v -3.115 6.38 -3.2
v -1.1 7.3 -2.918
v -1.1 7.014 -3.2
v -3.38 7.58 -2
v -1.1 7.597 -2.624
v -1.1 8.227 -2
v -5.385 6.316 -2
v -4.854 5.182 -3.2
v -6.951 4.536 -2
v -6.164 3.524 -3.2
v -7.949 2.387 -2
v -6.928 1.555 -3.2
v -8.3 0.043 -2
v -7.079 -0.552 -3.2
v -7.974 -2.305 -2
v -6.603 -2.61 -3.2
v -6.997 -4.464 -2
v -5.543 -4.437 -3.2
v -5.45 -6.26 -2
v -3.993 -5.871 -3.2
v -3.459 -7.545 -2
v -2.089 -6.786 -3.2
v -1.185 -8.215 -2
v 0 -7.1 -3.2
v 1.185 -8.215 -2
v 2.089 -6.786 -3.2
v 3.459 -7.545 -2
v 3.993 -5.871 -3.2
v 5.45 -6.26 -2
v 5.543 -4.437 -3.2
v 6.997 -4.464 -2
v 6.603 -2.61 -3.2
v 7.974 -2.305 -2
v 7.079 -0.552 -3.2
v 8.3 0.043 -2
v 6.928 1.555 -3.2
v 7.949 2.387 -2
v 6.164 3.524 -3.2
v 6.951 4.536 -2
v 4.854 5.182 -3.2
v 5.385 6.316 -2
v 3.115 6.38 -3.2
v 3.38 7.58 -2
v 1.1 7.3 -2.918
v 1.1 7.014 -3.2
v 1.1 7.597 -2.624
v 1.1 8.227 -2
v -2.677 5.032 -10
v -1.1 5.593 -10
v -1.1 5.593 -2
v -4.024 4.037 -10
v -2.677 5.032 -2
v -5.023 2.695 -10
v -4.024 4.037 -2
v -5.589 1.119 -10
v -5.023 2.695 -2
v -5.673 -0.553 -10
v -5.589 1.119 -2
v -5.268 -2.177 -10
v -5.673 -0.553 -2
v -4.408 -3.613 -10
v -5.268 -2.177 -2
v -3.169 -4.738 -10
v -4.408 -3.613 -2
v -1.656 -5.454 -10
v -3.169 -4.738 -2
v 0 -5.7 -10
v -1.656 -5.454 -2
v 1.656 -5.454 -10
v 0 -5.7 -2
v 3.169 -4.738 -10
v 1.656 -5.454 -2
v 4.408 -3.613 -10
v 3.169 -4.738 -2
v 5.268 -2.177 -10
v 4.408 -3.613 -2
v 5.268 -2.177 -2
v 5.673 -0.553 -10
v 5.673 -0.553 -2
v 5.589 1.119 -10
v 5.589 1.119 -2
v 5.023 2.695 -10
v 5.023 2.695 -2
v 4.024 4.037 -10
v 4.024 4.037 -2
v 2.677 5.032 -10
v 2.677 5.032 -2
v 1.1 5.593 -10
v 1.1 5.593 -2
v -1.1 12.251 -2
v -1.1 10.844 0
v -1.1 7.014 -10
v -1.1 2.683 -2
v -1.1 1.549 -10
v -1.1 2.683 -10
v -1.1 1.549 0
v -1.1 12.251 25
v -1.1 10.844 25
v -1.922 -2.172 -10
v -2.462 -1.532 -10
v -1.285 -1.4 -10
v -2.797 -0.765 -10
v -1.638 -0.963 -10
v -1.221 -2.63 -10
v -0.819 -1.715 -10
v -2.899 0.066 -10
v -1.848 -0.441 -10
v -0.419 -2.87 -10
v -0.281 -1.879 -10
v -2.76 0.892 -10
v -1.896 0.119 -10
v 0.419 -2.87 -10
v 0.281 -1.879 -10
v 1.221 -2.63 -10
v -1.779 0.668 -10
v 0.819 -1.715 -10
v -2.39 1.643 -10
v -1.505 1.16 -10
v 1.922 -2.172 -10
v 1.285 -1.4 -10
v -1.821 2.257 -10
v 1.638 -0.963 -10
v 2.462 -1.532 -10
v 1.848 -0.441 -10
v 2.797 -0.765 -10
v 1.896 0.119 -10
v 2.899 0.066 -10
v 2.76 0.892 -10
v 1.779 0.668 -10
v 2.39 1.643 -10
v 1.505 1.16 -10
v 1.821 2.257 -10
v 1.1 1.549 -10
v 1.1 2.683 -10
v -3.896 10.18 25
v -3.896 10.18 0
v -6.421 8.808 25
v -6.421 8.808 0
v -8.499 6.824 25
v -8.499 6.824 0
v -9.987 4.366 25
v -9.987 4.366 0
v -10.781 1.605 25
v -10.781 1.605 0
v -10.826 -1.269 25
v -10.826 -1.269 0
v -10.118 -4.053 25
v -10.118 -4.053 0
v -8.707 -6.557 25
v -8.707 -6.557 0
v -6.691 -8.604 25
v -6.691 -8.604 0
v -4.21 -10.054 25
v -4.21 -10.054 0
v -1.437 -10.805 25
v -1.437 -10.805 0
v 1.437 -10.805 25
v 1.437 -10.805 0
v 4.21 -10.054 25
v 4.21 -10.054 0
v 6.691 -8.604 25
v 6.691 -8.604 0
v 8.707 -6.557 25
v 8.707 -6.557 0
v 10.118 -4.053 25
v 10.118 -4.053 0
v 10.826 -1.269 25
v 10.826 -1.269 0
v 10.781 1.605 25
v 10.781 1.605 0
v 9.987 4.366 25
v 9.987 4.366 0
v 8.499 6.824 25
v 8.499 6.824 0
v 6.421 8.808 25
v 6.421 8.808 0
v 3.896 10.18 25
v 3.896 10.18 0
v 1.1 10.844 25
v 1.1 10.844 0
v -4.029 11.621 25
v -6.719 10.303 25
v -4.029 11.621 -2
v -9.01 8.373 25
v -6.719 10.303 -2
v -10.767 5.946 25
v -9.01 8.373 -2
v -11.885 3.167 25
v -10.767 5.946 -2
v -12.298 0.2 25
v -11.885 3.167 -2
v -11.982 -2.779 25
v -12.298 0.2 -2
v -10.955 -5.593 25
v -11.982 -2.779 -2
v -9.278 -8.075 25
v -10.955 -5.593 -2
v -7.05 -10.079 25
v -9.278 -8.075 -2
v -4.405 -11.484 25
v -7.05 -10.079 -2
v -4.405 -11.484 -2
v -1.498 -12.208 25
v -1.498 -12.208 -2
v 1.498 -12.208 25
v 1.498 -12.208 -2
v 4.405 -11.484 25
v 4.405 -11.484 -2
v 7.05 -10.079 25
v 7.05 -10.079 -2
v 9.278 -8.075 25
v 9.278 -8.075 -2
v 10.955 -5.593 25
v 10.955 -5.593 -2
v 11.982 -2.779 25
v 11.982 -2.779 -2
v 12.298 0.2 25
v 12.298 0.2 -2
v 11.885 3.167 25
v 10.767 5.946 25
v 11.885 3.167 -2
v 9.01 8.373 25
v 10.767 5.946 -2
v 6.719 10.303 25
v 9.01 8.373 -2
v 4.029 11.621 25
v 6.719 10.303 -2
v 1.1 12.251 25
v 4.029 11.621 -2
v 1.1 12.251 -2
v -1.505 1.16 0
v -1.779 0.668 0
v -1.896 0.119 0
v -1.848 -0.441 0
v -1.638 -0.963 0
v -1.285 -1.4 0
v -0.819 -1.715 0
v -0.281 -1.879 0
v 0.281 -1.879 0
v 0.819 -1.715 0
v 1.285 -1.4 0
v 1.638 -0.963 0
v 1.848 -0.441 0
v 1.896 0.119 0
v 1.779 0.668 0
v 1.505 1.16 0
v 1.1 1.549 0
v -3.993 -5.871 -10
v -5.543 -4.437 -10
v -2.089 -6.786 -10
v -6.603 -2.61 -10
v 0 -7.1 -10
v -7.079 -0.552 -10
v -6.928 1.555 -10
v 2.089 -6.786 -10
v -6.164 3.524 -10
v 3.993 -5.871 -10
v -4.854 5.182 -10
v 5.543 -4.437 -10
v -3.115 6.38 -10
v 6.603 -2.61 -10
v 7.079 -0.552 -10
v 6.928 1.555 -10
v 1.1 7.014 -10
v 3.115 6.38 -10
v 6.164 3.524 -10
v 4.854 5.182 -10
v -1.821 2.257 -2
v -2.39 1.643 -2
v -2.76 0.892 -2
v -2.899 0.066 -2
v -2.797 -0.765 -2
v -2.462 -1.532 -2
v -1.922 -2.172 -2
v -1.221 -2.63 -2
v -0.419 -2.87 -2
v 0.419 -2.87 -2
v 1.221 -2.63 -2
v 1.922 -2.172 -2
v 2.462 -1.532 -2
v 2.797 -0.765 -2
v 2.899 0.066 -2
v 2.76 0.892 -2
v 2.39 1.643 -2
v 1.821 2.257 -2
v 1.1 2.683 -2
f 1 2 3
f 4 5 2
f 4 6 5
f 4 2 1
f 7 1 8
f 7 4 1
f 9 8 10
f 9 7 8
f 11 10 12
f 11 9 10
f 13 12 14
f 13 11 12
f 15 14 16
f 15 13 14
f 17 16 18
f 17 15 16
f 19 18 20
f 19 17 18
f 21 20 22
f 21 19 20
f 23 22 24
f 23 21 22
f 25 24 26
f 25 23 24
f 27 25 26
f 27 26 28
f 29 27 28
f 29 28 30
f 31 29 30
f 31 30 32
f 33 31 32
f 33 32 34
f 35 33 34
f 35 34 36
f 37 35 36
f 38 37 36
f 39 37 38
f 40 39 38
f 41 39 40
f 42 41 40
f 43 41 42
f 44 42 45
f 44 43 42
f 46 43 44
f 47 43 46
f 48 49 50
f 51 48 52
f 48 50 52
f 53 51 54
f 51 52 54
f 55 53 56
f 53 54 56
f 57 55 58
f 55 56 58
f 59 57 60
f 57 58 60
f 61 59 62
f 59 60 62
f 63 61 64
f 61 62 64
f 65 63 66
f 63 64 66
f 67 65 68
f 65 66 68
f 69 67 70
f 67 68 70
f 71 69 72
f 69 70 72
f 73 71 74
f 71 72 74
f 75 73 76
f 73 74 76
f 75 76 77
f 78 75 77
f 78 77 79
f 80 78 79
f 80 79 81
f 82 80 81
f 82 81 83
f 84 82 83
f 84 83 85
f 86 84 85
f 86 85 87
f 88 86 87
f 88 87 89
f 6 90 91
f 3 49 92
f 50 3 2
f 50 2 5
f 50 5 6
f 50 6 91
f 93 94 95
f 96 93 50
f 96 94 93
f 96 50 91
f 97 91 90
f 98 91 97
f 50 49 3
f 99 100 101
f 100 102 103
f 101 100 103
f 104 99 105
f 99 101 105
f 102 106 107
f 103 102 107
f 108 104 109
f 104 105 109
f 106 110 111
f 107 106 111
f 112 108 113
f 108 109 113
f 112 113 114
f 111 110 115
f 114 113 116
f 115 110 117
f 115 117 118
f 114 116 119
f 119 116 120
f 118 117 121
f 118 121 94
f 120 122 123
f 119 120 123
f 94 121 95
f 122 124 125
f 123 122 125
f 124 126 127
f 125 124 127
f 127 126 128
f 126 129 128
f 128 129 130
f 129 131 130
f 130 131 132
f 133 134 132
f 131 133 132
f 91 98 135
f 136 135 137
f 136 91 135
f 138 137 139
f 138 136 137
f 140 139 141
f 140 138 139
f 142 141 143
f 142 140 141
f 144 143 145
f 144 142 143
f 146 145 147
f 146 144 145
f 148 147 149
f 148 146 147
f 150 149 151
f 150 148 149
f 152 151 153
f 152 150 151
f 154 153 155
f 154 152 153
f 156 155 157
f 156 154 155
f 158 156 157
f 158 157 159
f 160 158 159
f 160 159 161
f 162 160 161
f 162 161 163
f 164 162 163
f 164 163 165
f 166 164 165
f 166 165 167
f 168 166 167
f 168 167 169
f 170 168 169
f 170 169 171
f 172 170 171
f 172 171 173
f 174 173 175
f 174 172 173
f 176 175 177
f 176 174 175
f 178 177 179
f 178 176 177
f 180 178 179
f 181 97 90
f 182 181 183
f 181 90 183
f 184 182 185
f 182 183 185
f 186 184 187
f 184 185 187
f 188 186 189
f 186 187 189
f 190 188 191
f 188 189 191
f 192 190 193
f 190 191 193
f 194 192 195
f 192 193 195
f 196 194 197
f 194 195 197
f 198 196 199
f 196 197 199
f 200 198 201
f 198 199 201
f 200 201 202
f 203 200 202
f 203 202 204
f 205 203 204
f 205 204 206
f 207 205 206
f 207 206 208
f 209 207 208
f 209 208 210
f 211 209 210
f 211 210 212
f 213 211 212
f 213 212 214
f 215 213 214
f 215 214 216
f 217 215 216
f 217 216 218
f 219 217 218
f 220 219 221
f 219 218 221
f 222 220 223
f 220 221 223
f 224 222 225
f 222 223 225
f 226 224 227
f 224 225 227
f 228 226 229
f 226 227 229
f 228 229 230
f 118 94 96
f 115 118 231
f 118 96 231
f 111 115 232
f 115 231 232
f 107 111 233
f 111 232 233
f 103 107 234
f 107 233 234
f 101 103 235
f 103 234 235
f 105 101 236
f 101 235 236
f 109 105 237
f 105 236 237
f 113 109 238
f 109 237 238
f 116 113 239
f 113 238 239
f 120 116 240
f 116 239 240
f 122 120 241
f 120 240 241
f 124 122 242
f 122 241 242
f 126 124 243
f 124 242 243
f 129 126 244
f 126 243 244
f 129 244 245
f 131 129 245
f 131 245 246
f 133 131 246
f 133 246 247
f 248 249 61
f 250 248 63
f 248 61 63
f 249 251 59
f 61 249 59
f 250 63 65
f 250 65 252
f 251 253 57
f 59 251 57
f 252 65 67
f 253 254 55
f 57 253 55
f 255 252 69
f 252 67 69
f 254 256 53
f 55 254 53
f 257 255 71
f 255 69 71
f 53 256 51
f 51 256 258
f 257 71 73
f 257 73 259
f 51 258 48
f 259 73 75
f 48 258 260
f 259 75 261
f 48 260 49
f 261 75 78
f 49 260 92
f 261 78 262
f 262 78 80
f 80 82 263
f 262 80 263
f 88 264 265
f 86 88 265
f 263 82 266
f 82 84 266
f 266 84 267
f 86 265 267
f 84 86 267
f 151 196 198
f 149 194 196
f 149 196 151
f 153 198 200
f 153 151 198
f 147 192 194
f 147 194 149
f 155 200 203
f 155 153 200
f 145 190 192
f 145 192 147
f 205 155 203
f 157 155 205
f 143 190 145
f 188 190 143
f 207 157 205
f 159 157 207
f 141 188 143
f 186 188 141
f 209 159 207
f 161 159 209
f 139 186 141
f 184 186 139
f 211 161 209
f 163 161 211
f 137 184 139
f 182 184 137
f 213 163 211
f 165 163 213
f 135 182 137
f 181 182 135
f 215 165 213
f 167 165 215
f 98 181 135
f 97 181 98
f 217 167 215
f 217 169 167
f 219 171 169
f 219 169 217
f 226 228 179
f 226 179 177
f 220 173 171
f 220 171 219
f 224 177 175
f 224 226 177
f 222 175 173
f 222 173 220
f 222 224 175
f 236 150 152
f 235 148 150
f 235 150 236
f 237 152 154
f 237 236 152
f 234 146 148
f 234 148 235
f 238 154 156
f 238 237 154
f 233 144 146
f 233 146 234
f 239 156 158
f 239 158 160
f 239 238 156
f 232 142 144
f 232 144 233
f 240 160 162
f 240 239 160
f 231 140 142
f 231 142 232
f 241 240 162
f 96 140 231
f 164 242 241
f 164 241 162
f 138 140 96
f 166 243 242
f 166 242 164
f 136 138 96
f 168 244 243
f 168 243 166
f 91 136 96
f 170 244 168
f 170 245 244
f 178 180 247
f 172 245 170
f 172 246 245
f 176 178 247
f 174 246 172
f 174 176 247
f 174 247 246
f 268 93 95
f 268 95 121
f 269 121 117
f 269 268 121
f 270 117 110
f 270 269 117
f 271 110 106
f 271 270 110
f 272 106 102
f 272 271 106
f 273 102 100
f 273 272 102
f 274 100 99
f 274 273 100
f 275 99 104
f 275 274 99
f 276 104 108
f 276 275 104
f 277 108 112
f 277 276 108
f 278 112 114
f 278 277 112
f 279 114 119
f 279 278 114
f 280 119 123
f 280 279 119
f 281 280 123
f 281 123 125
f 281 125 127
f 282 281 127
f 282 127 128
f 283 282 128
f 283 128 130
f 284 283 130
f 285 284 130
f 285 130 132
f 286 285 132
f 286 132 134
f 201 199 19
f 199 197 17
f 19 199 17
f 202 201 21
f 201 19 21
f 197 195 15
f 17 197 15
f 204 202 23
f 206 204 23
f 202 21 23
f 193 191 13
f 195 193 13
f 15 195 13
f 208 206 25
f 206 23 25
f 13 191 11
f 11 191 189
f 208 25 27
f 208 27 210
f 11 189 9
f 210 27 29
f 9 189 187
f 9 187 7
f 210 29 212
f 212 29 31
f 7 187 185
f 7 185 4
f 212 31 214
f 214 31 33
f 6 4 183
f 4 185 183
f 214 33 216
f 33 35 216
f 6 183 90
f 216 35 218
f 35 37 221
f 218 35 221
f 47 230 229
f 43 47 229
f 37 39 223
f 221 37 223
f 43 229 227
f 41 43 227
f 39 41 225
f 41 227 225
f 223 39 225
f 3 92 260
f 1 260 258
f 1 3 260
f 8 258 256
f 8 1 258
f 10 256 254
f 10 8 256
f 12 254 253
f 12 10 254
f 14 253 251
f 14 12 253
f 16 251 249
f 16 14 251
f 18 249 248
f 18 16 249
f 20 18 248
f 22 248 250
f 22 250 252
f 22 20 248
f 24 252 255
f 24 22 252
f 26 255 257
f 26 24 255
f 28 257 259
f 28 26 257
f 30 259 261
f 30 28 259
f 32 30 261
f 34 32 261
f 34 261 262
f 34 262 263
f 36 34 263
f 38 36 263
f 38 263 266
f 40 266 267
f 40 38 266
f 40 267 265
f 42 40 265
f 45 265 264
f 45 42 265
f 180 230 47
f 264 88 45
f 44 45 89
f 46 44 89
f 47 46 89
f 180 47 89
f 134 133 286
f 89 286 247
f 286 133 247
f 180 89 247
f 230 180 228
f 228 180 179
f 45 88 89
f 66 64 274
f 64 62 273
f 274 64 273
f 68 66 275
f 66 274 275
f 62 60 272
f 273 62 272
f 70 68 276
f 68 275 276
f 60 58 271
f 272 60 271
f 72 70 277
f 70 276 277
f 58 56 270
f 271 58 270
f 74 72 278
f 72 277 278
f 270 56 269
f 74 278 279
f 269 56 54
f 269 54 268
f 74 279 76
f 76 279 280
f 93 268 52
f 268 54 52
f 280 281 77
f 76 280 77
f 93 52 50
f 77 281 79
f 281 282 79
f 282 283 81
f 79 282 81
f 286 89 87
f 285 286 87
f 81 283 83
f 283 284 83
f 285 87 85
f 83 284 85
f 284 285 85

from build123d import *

# Parameters (mm, degrees)
F0_R     = 12.3
F0_R_2   = 10.9
F0_R_3   = 7.1
F0_R_4   = 5.7
F0_R_5   = 2.9
F0_R_6   = 1.9
F1_DEPTH = 2
F2_DEPTH = 10
F3_DEPTH = 25
F4_W     = 2.2
F4_H     = 35
F5_DEPTH = 12.301
F6_SIZE  = 1.2


with BuildPart() as f1:
    # F0 (on Top) → F1 (new body)
    with BuildSketch(Plane.XY):
        Circle(F0_R)
        Circle(F0_R_2, mode=Mode.SUBTRACT)
        Circle(F0_R_2)
        Circle(F0_R_3, mode=Mode.SUBTRACT)
        Circle(F0_R_3)
        Circle(F0_R_4, mode=Mode.SUBTRACT)
        Circle(F0_R_4)
        Circle(F0_R_5, mode=Mode.SUBTRACT)
        Circle(F0_R_5)
        Circle(F0_R_6, mode=Mode.SUBTRACT)
    extrude(amount=-F1_DEPTH)

    # F0 (on Top) → F2 (join)
    with BuildSketch(Plane.XY):
        Circle(F0_R_3)
        Circle(F0_R_4, mode=Mode.SUBTRACT)
        Circle(F0_R_5)
        Circle(F0_R_6, mode=Mode.SUBTRACT)
    extrude(amount=-F2_DEPTH)

    # F0 (on Top) → F3 (join)
    with BuildSketch(Plane.XY):
        Circle(F0_R)
        Circle(F0_R_2, mode=Mode.SUBTRACT)
    extrude(amount=F3_DEPTH)

    # F4 (on Front) → F5 (cut, through all)
    with BuildSketch(Plane.XZ):
        with Locations((0, 7.5)):
            Rectangle(F4_W, F4_H)
    extrude(amount=-F5_DEPTH, mode=Mode.SUBTRACT)

    # F6
    f6_edges = [f1.edges().sort_by_distance(p)[0] for p in [
        (0, -7.1, -2),
    ]]
    chamfer(f6_edges, length=F6_SIZE)


solid = f1.part
